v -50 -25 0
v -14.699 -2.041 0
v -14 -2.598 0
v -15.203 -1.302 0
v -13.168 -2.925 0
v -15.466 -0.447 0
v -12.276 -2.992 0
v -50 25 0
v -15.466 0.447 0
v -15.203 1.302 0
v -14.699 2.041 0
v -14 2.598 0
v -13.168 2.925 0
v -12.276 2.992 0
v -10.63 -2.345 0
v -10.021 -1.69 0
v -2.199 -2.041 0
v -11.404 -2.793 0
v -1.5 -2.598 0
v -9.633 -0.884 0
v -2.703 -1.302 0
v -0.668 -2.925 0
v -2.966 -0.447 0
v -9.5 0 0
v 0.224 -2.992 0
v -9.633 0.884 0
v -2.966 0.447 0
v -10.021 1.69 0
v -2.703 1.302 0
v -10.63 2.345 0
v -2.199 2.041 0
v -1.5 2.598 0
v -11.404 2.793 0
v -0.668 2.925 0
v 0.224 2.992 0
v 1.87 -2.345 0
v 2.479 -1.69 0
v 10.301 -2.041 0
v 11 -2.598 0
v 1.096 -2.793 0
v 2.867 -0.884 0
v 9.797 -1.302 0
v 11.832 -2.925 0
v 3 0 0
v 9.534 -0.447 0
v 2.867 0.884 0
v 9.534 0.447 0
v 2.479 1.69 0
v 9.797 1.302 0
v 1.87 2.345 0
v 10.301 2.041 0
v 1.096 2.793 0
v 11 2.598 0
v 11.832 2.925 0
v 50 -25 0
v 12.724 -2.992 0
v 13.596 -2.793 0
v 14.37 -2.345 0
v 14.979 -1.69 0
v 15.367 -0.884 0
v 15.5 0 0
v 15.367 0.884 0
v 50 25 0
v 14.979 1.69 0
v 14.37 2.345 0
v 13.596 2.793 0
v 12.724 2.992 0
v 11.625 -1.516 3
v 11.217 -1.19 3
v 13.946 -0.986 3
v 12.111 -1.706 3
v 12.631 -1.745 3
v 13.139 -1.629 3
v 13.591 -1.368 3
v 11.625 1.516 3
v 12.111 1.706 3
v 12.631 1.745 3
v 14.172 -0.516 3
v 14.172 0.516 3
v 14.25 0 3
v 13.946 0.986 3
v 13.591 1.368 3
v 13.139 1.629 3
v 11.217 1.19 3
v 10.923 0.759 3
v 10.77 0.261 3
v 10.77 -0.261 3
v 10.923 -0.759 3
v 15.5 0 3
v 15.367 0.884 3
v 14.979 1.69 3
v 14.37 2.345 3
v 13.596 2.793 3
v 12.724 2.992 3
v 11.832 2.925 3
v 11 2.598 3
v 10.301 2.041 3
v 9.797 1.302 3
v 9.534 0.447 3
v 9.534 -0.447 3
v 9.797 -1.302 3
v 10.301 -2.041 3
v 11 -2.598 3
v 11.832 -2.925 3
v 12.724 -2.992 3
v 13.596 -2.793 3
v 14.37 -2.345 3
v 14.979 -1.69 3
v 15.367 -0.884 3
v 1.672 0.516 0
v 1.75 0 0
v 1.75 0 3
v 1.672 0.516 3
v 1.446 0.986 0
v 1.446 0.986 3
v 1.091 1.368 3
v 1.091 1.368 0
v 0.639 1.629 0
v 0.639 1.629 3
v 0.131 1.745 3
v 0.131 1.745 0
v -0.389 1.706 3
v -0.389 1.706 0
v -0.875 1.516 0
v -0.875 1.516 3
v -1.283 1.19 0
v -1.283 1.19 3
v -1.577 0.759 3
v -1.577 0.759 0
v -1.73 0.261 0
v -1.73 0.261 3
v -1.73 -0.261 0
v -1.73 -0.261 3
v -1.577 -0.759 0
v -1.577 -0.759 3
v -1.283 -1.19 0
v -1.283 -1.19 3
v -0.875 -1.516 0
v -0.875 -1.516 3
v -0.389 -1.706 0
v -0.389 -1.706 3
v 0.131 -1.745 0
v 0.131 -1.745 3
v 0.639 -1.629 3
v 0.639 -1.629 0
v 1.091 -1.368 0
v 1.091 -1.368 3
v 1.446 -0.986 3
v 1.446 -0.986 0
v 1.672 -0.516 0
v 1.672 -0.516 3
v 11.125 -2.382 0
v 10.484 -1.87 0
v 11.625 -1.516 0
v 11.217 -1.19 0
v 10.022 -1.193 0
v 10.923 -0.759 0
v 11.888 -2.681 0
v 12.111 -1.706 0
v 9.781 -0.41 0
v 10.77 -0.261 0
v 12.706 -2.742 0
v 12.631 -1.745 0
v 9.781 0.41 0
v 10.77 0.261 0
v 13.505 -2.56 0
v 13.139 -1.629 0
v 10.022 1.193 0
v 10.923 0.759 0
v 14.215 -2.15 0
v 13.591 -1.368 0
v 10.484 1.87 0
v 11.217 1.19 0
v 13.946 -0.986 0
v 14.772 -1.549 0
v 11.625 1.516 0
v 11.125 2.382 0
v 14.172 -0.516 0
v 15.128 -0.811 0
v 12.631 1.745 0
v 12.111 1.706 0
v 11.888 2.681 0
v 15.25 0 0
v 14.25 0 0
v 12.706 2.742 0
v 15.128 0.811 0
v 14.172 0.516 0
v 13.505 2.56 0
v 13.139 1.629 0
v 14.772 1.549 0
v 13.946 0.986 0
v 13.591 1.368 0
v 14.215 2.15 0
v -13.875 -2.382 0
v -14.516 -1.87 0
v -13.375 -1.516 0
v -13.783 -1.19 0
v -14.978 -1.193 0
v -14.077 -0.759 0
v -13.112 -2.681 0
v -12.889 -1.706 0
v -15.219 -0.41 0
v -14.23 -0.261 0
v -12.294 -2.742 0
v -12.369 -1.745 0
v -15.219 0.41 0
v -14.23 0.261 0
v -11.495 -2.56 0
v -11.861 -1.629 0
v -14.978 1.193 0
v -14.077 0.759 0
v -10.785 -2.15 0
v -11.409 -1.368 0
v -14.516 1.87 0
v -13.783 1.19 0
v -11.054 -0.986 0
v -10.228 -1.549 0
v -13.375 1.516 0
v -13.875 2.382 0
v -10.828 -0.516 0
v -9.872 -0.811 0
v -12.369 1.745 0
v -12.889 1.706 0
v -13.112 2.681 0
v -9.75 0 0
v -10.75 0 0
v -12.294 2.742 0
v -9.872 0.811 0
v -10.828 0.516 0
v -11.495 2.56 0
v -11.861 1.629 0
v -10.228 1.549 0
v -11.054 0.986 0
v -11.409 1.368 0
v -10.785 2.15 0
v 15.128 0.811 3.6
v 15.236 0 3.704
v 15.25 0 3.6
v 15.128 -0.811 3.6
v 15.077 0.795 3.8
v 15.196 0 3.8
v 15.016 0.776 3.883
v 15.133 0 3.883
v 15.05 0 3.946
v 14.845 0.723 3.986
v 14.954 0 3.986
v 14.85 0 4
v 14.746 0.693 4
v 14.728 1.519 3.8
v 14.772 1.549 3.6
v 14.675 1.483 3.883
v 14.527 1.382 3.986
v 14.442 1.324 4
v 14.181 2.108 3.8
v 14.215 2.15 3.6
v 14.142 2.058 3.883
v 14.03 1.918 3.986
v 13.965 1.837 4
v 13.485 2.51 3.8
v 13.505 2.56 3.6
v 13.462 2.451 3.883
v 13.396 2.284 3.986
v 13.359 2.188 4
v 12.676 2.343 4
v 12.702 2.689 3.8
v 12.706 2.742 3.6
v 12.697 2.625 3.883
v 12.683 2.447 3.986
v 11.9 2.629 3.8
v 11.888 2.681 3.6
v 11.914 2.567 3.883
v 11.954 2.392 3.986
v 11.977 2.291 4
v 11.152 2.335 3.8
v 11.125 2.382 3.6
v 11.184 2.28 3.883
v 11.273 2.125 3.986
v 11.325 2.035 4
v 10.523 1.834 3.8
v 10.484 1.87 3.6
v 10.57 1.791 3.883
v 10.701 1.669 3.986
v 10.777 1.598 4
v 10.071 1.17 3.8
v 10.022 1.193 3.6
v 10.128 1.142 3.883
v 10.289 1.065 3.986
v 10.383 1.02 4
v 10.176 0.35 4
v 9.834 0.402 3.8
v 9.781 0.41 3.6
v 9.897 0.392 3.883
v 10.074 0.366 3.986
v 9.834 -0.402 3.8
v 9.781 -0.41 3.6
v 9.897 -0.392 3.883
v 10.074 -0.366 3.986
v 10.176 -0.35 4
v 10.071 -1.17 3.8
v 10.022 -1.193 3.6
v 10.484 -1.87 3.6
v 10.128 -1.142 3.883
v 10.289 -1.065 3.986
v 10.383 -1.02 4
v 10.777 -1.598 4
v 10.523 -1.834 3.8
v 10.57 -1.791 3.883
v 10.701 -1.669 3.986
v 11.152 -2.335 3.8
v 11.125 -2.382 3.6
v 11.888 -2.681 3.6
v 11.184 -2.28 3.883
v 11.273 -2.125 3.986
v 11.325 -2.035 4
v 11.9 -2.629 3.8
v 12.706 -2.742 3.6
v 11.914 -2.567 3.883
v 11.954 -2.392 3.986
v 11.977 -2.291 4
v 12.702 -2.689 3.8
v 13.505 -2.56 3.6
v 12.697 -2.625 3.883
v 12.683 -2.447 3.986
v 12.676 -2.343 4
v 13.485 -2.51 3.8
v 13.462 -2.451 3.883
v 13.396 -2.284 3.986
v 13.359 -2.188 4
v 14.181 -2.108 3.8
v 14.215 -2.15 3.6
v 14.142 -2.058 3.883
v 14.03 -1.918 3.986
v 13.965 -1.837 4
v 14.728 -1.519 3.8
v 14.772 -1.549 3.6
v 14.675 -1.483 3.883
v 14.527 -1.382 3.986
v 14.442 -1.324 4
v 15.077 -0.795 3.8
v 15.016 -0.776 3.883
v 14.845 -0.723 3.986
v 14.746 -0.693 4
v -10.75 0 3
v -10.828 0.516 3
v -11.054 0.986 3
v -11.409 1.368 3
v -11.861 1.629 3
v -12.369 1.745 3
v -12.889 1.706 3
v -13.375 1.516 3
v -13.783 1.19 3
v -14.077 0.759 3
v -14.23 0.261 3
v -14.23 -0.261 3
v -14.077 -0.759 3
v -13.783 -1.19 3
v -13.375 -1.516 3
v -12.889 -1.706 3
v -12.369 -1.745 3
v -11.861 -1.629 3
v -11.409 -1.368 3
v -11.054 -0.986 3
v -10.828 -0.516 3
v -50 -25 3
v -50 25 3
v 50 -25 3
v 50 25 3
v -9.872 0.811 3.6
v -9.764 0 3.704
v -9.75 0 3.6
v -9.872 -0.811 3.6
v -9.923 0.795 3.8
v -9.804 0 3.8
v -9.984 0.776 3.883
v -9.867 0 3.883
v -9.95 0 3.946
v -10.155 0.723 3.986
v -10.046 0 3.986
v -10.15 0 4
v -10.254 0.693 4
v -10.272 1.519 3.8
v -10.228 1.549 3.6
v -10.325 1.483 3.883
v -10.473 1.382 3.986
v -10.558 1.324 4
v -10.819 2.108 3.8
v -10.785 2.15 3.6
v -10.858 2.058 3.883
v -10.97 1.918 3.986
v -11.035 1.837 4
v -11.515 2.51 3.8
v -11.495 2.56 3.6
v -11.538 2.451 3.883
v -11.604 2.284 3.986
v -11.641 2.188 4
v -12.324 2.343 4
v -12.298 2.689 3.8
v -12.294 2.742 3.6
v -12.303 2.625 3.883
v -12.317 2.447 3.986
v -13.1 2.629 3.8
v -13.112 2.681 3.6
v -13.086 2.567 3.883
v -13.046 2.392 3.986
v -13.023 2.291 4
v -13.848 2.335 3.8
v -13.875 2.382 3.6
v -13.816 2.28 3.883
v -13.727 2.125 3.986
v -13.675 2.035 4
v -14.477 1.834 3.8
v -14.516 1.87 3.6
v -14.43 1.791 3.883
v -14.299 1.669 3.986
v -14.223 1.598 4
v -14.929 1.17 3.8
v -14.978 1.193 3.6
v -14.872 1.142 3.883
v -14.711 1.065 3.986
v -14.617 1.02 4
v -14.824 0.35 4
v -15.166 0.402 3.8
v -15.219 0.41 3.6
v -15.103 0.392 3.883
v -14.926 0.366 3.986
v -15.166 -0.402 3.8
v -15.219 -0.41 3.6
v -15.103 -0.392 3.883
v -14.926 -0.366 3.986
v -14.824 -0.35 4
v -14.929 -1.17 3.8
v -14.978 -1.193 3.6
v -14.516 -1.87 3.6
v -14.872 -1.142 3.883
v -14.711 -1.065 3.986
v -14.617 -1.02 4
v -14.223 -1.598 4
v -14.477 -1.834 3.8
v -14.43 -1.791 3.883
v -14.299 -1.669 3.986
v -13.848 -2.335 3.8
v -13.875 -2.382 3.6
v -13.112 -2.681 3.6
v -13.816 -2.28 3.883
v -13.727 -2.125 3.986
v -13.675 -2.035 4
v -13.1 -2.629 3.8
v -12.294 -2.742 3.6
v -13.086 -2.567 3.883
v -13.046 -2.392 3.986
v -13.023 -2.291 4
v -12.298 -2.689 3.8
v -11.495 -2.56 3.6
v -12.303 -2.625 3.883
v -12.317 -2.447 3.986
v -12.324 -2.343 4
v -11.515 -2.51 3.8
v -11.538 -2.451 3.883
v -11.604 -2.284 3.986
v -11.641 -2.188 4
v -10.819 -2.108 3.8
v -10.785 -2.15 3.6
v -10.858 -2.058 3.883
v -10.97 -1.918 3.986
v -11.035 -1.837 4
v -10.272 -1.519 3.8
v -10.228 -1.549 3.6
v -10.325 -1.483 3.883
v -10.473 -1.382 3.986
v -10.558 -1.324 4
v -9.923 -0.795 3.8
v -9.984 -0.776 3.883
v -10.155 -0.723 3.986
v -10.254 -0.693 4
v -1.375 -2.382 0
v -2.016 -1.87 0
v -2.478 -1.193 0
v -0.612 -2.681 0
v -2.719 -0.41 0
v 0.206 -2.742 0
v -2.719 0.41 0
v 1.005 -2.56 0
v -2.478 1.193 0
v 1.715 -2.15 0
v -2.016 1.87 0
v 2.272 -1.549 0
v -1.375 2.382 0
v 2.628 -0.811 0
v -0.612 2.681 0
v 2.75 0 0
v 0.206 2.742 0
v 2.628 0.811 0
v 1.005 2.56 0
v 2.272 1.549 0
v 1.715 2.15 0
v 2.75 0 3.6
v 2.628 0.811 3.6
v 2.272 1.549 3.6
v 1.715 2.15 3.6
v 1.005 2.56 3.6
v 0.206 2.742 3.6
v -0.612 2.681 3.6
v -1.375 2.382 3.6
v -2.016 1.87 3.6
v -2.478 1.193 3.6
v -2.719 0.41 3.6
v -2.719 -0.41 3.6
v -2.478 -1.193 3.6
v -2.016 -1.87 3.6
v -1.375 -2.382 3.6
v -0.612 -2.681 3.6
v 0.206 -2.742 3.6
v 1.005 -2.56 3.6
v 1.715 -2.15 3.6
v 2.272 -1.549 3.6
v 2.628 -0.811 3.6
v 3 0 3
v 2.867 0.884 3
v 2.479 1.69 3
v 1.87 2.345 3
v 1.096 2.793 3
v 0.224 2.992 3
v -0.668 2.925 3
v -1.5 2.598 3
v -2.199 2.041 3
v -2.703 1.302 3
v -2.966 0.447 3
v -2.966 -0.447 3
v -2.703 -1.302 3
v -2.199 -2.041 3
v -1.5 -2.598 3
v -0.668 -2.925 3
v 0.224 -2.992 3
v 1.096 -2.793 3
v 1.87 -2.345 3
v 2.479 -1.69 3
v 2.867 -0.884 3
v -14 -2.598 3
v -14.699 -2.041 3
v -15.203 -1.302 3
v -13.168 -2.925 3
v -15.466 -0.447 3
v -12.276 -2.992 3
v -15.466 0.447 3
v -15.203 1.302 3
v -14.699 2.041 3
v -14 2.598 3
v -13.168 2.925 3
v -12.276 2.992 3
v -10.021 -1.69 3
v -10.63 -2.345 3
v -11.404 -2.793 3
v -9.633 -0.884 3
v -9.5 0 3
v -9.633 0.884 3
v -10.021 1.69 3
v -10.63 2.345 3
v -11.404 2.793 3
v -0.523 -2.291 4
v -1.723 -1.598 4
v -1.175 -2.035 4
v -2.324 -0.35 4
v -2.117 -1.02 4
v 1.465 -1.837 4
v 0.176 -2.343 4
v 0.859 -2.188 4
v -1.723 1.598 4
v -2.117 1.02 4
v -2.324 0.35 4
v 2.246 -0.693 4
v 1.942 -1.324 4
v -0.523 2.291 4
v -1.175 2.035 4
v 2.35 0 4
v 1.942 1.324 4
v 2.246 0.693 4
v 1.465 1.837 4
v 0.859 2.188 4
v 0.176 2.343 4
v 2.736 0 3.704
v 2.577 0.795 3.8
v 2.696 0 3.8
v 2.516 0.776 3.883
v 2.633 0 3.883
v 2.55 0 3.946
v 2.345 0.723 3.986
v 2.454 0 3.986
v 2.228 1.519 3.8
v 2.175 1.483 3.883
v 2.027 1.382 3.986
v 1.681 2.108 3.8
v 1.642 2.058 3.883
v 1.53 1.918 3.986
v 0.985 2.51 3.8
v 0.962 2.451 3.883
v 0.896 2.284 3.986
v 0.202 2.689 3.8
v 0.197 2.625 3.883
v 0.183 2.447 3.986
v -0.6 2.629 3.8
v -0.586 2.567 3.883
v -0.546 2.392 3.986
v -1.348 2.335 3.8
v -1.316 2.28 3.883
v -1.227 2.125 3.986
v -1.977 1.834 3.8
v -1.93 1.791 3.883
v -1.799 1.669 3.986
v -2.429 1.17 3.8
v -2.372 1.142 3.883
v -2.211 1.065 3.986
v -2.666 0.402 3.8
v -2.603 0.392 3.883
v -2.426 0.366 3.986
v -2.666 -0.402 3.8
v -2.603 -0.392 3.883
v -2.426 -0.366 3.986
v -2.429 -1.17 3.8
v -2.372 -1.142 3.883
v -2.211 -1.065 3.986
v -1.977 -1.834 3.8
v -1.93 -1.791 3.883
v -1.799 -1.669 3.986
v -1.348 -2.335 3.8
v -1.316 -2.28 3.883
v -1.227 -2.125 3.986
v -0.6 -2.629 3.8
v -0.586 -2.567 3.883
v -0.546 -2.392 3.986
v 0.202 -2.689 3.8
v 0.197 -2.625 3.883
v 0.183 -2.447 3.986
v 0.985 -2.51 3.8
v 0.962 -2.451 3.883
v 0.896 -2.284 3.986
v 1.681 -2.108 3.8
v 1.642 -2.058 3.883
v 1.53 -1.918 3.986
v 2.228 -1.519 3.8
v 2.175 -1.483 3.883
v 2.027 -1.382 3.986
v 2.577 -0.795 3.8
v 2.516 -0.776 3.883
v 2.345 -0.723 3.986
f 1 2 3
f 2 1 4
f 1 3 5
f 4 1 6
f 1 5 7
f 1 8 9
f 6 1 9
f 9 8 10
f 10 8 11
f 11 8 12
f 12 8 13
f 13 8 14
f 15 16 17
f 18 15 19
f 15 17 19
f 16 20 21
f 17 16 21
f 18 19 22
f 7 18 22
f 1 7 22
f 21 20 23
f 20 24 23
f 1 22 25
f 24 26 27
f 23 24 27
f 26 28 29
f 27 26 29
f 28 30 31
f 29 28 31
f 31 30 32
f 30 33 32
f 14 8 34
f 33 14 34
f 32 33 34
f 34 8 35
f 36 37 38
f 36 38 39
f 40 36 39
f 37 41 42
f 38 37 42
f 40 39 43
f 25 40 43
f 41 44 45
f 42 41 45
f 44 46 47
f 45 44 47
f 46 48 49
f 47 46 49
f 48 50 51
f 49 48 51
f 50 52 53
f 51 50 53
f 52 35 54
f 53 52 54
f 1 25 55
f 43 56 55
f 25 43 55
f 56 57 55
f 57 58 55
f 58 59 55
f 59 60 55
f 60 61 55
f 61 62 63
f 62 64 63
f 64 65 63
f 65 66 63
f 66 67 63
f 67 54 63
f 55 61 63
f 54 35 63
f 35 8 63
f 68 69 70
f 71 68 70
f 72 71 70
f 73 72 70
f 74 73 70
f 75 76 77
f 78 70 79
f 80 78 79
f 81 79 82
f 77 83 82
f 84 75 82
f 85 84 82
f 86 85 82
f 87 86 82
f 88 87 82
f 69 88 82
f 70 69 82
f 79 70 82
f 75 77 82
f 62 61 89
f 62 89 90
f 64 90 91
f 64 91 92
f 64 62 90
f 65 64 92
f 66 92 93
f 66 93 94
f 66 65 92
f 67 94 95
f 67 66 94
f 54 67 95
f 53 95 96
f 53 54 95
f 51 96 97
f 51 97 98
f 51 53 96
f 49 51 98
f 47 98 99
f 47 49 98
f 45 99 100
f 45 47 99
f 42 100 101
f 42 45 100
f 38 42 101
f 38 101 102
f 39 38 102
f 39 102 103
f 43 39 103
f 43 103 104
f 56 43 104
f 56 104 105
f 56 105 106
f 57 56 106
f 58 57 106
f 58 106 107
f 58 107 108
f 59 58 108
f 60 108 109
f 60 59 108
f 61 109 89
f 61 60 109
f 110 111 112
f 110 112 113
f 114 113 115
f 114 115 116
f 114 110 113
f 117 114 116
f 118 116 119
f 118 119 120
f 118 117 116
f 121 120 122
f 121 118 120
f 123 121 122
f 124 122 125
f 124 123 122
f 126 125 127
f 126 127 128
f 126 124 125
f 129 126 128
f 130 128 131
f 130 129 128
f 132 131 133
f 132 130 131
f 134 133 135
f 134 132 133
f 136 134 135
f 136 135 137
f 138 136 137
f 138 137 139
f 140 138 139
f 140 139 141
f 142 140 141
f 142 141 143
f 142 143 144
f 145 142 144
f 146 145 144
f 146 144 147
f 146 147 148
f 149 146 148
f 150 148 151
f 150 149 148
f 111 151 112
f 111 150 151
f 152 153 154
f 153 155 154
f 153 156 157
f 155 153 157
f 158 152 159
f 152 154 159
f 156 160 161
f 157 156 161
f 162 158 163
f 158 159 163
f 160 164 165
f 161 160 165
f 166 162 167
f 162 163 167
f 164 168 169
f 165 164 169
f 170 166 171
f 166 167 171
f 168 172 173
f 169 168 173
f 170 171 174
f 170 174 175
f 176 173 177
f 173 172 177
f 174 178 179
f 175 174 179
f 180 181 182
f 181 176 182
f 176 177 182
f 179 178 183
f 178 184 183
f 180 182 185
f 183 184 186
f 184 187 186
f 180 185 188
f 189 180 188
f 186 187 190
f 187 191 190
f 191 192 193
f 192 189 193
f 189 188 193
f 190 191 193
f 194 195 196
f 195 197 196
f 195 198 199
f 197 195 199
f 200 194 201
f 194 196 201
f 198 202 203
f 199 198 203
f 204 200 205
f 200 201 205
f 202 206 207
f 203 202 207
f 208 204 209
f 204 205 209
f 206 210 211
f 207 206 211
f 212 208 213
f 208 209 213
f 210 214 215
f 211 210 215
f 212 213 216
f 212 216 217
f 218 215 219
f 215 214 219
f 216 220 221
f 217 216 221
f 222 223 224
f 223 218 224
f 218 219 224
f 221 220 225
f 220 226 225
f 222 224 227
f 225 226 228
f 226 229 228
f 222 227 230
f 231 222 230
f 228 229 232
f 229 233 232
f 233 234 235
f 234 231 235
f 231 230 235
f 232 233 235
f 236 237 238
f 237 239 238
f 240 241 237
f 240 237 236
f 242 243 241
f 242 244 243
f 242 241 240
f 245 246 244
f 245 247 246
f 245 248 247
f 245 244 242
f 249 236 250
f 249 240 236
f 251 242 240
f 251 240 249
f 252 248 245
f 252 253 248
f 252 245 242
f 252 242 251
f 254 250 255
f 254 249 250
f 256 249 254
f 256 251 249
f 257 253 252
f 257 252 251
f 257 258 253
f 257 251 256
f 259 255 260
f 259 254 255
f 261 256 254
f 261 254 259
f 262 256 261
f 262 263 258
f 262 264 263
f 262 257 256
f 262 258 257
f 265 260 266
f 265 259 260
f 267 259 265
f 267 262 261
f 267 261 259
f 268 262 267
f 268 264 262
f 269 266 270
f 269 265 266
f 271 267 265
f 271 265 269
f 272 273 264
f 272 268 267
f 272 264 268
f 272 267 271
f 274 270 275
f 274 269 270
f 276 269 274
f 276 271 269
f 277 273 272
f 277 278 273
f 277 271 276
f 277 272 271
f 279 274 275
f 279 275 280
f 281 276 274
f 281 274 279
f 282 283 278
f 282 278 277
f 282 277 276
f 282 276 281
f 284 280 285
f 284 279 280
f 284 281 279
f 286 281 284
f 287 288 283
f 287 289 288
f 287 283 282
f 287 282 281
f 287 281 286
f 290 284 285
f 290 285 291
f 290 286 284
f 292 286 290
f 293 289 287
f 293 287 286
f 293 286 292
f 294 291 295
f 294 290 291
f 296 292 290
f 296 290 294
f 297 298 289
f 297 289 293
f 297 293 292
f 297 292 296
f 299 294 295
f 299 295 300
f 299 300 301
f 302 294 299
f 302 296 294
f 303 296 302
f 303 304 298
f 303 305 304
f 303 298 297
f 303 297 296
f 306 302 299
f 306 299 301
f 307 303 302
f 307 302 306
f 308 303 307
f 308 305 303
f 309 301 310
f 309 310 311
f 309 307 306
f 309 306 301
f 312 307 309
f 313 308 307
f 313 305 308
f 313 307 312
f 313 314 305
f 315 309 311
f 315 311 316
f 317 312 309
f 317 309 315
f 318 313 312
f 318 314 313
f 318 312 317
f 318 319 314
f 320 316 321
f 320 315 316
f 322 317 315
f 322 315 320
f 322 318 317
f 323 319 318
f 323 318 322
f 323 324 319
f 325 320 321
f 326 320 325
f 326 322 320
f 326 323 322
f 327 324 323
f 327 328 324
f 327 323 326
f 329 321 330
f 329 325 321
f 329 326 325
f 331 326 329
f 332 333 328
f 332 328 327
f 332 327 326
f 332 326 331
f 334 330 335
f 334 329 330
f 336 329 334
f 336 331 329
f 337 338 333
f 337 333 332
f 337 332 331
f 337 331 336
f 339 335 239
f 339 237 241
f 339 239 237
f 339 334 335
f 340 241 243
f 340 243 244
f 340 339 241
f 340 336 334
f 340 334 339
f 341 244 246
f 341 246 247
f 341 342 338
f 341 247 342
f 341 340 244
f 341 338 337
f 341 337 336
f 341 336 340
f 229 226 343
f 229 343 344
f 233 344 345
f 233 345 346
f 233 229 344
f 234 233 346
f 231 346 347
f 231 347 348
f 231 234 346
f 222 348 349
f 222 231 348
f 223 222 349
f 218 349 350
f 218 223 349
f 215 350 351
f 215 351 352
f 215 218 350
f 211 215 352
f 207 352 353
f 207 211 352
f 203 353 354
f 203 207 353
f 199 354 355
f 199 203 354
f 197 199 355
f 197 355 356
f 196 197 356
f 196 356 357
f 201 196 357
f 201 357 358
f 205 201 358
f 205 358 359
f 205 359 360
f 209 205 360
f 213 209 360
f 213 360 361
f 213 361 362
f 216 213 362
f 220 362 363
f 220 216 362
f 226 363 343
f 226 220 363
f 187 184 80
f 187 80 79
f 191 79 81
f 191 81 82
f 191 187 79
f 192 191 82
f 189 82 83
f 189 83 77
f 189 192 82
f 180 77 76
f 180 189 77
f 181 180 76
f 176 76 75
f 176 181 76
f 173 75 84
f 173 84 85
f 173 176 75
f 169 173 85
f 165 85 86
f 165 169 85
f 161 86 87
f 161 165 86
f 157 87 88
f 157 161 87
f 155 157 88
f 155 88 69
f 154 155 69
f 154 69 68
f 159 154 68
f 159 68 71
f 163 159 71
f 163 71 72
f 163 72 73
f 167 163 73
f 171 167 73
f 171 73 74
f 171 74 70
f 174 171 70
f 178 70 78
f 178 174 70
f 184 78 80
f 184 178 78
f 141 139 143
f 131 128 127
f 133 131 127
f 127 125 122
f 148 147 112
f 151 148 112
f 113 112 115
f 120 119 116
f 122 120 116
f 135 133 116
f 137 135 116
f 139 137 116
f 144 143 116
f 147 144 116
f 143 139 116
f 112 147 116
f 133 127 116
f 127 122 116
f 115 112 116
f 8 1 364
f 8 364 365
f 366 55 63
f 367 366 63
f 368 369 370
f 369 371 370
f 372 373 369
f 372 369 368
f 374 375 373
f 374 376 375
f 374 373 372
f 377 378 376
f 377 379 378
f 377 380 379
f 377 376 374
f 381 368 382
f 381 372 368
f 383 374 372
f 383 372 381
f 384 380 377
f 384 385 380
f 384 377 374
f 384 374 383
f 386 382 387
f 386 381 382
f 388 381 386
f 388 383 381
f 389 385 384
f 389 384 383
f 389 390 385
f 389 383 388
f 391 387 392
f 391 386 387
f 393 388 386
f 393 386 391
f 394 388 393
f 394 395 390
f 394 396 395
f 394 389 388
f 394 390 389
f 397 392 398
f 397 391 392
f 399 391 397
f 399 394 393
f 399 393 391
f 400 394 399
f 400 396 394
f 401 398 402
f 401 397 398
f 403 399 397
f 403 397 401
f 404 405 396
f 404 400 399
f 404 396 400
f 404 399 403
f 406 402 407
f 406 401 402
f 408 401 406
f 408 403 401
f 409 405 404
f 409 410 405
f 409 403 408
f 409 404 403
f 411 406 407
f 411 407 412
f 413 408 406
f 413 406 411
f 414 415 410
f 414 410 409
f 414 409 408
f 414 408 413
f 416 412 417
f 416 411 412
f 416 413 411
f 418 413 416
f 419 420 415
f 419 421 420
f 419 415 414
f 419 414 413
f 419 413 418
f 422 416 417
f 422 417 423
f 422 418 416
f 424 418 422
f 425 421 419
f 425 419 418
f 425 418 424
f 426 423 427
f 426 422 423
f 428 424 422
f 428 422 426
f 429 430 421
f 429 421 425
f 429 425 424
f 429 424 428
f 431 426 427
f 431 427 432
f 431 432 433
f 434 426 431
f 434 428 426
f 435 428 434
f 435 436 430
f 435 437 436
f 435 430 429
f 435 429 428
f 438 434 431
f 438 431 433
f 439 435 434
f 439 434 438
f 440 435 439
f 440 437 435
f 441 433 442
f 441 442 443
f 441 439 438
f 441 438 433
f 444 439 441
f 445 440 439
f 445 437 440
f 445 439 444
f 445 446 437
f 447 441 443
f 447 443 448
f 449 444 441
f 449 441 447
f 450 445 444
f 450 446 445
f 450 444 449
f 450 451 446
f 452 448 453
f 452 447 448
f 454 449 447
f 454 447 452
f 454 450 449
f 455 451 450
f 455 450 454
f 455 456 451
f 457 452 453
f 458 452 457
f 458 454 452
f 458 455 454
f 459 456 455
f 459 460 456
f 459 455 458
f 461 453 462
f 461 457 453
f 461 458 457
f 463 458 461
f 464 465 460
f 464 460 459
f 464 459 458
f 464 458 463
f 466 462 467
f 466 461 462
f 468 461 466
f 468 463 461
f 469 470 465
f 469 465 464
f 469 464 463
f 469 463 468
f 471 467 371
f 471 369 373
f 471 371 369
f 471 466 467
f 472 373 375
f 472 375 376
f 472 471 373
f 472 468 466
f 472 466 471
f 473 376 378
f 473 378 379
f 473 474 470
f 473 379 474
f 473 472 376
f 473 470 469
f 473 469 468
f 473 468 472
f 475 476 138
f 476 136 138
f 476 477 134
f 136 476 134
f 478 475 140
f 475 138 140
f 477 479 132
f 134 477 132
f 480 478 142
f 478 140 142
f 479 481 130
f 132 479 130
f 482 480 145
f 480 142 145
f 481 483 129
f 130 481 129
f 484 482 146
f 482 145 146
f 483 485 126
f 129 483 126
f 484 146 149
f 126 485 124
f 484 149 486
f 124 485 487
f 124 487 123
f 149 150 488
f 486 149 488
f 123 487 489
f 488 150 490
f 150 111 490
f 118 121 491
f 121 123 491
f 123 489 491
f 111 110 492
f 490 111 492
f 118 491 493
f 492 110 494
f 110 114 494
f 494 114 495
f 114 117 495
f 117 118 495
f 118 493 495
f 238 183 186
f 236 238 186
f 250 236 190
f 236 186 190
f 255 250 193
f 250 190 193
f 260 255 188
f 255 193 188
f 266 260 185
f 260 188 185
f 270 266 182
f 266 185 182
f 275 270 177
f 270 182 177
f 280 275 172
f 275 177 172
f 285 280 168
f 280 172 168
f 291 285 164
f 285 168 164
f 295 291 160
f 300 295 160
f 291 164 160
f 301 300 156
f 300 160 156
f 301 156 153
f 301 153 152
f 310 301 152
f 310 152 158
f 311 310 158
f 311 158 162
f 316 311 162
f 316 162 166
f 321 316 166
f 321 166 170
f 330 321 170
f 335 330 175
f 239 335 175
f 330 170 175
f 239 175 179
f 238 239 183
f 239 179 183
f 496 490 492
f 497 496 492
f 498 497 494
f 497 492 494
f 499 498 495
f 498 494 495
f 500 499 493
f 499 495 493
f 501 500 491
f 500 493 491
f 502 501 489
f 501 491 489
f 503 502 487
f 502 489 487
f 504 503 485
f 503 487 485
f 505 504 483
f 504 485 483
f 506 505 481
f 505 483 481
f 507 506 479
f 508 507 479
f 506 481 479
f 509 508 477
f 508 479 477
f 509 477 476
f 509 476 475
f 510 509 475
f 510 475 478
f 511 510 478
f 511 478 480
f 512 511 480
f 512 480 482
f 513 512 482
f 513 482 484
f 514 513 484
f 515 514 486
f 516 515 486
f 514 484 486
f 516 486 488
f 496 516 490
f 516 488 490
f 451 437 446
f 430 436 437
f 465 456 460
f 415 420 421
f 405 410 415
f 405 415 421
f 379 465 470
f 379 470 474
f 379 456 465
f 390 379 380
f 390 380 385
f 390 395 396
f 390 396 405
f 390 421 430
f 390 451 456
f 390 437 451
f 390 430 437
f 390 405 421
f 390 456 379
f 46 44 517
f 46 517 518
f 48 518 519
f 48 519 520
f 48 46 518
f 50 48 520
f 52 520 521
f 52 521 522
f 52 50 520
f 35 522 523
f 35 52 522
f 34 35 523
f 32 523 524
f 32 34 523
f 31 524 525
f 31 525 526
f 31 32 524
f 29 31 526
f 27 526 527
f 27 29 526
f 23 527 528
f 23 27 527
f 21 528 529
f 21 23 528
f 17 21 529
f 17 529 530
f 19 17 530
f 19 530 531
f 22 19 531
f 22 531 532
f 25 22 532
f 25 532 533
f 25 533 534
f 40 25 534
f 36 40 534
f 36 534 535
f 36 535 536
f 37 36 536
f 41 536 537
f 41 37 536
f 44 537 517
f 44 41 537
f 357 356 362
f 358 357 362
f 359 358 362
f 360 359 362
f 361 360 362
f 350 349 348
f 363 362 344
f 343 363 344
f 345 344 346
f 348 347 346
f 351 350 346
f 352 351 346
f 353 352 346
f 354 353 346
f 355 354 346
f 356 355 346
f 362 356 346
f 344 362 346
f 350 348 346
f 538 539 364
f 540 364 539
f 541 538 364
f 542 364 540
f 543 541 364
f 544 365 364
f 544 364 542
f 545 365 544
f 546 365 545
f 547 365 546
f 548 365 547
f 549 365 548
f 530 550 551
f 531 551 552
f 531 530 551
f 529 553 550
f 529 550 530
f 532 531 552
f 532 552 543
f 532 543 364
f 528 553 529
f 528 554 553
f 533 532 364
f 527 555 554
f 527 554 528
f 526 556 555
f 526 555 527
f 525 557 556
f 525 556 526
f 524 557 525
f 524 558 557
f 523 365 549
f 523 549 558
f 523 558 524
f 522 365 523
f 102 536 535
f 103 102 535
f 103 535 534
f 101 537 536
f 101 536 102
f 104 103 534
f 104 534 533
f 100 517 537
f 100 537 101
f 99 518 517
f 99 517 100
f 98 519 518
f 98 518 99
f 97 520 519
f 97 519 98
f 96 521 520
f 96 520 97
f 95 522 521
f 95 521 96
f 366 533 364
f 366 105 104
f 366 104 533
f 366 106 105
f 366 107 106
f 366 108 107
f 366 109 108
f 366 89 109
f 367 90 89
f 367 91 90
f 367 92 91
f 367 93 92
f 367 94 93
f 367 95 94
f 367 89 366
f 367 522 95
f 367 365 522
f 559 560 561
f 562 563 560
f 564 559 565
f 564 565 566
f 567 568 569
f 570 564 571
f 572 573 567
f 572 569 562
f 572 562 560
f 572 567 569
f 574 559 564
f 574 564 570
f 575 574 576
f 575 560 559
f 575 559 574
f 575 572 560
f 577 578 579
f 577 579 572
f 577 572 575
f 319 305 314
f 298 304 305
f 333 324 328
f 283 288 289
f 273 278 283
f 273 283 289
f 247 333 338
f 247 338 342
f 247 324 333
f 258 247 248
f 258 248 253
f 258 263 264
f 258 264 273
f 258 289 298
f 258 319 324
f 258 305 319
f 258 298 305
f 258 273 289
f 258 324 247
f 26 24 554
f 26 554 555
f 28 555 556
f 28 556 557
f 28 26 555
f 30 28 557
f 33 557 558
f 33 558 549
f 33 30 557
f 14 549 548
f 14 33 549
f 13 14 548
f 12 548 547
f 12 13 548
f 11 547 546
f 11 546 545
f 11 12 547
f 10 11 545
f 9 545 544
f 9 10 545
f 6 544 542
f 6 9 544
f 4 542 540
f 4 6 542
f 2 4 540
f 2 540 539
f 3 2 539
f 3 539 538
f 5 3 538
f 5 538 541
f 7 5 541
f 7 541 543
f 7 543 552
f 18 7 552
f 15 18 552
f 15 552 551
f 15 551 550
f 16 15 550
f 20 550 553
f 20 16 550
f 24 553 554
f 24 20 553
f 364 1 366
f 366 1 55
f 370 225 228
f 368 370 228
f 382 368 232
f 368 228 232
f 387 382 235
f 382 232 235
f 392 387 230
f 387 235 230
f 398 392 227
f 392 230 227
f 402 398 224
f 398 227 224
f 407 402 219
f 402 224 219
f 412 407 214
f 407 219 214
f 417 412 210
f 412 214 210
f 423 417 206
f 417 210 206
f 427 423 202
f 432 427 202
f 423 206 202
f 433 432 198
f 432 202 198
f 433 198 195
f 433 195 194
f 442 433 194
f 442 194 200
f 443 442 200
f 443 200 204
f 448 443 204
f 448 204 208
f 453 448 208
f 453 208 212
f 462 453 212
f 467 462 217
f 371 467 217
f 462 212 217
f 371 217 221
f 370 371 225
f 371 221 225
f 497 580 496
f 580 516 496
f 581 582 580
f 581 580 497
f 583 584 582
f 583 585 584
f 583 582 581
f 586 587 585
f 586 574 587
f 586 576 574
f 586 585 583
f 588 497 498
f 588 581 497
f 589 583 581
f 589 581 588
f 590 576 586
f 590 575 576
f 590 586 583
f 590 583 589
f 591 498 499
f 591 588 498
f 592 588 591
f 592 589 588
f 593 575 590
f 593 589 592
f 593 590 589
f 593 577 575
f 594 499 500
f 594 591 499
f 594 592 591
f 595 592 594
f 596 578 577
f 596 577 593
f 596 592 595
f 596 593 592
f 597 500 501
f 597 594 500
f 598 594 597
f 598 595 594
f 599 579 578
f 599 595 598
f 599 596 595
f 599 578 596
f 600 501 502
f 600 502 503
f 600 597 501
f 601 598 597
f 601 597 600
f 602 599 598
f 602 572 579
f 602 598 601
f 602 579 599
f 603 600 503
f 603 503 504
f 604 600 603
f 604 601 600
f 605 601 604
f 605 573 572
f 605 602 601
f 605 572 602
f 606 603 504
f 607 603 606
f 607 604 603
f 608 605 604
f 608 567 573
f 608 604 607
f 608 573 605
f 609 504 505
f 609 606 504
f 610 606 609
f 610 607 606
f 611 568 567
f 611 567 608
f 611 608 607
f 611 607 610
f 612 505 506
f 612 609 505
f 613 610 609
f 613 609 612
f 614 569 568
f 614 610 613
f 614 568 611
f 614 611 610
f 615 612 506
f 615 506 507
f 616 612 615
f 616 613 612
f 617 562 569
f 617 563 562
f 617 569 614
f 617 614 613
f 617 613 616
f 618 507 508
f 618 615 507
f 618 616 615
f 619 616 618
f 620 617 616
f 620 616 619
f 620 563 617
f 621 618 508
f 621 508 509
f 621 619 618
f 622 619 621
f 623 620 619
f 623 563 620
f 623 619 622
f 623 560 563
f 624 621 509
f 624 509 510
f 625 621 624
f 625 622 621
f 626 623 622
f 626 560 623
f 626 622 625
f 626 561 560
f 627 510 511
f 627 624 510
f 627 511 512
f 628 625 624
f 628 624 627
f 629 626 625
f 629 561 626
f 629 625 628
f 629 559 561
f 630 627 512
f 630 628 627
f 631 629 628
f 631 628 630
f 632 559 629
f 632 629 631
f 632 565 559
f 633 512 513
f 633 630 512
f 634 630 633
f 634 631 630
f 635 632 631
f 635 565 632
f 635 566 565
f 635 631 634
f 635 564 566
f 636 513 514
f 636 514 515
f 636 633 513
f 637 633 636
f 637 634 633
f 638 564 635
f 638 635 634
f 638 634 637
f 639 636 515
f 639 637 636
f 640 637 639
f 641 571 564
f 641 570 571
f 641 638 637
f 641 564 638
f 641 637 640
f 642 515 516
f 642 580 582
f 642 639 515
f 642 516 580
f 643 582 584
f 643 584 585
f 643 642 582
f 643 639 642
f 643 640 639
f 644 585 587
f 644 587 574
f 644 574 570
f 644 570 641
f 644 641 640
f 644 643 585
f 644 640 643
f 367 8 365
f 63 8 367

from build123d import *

# Parameters (mm, degrees)
F0_W     = 100
F0_H     = 50
F0_R     = 3
F1_DEPTH = 3
F0_R_2   = 2.75
F0_R_3   = 1.75
F2_DEPTH = 4
F3_DEPTH = 3
F4_R     = 0.4
F4_2_R   = 0.4
F4_3_R   = 0.4


with BuildPart() as f1:
    # F0 (on Top) → F1 (new body)
    with BuildSketch(Plane.XY):
        Rectangle(F0_W, F0_H)
        with Locations((-12.5, 0)):
            Circle(F0_R, mode=Mode.SUBTRACT)
        Circle(F0_R, mode=Mode.SUBTRACT)
        with Locations((12.5, 0)):
            Circle(F0_R, mode=Mode.SUBTRACT)
    extrude(amount=F1_DEPTH)


with BuildPart() as f2:
    # F0 (on Top) → F2 (new body)
    with BuildSketch(Plane.XY):
        with Locations((-12.5, 0)):
            Circle(F0_R_2)
        with Locations((-12.5, 0)):
            Circle(F0_R_3, mode=Mode.SUBTRACT)
        with Locations((-12.5, 0)):
            Circle(F0_R_3)
    extrude(amount=F2_DEPTH)


with BuildPart() as f2b:
    # F0 (on Top) → F2, piece 2 (new body)
    with BuildSketch(Plane.XY):
        Circle(F0_R_2)
        Circle(F0_R_3, mode=Mode.SUBTRACT)
        Circle(F0_R_3)
    extrude(amount=F2_DEPTH)


with BuildPart() as f2c:
    # F0 (on Top) → F2, piece 3 (new body)
    with BuildSketch(Plane.XY):
        with Locations((12.5, 0)):
            Circle(F0_R_2)
        with Locations((12.5, 0)):
            Circle(F0_R_3, mode=Mode.SUBTRACT)
        with Locations((12.5, 0)):
            Circle(F0_R_3)
    extrude(amount=F2_DEPTH)


with BuildPart() as f3_tool:
    # F0 (on Top) → F3 (new body)
    with BuildSketch(Plane.XY):
        with Locations((-12.5, 0)):
            Circle(F0_R_3)
        Circle(F0_R_3)
        with Locations((12.5, 0)):
            Circle(F0_R_3)
    extrude(amount=F3_DEPTH)


with BuildPart() as f2_1:
    add(f2.part)

    # F3: cut by f3_tool
    add(f3_tool.part, mode=Mode.SUBTRACT)

    # F4#3
    f4_3_edges = [f2_1.edges().sort_by_distance(p)[0] for p in [
        (-15.25, 0, 4),
    ]]
    fillet(f4_3_edges, radius=F4_3_R)


with BuildPart() as f2b_1:
    add(f2b.part)

    # F3: cut by f3_tool
    add(f3_tool.part, mode=Mode.SUBTRACT)

    # F4#2
    f4_2_edges = [f2b_1.edges().sort_by_distance(p)[0] for p in [
        (-2.75, 0, 4),
    ]]
    fillet(f4_2_edges, radius=F4_2_R)


with BuildPart() as f2c_1:
    add(f2c.part)

    # F3: cut by f3_tool
    add(f3_tool.part, mode=Mode.SUBTRACT)

    # F4
    f4_edges = [f2c_1.edges().sort_by_distance(p)[0] for p in [
        (9.75, 0, 4),
    ]]
    fillet(f4_edges, radius=F4_R)


solid = Compound([f1.part, f2_1.part, f2b_1.part, f2c_1.part])
